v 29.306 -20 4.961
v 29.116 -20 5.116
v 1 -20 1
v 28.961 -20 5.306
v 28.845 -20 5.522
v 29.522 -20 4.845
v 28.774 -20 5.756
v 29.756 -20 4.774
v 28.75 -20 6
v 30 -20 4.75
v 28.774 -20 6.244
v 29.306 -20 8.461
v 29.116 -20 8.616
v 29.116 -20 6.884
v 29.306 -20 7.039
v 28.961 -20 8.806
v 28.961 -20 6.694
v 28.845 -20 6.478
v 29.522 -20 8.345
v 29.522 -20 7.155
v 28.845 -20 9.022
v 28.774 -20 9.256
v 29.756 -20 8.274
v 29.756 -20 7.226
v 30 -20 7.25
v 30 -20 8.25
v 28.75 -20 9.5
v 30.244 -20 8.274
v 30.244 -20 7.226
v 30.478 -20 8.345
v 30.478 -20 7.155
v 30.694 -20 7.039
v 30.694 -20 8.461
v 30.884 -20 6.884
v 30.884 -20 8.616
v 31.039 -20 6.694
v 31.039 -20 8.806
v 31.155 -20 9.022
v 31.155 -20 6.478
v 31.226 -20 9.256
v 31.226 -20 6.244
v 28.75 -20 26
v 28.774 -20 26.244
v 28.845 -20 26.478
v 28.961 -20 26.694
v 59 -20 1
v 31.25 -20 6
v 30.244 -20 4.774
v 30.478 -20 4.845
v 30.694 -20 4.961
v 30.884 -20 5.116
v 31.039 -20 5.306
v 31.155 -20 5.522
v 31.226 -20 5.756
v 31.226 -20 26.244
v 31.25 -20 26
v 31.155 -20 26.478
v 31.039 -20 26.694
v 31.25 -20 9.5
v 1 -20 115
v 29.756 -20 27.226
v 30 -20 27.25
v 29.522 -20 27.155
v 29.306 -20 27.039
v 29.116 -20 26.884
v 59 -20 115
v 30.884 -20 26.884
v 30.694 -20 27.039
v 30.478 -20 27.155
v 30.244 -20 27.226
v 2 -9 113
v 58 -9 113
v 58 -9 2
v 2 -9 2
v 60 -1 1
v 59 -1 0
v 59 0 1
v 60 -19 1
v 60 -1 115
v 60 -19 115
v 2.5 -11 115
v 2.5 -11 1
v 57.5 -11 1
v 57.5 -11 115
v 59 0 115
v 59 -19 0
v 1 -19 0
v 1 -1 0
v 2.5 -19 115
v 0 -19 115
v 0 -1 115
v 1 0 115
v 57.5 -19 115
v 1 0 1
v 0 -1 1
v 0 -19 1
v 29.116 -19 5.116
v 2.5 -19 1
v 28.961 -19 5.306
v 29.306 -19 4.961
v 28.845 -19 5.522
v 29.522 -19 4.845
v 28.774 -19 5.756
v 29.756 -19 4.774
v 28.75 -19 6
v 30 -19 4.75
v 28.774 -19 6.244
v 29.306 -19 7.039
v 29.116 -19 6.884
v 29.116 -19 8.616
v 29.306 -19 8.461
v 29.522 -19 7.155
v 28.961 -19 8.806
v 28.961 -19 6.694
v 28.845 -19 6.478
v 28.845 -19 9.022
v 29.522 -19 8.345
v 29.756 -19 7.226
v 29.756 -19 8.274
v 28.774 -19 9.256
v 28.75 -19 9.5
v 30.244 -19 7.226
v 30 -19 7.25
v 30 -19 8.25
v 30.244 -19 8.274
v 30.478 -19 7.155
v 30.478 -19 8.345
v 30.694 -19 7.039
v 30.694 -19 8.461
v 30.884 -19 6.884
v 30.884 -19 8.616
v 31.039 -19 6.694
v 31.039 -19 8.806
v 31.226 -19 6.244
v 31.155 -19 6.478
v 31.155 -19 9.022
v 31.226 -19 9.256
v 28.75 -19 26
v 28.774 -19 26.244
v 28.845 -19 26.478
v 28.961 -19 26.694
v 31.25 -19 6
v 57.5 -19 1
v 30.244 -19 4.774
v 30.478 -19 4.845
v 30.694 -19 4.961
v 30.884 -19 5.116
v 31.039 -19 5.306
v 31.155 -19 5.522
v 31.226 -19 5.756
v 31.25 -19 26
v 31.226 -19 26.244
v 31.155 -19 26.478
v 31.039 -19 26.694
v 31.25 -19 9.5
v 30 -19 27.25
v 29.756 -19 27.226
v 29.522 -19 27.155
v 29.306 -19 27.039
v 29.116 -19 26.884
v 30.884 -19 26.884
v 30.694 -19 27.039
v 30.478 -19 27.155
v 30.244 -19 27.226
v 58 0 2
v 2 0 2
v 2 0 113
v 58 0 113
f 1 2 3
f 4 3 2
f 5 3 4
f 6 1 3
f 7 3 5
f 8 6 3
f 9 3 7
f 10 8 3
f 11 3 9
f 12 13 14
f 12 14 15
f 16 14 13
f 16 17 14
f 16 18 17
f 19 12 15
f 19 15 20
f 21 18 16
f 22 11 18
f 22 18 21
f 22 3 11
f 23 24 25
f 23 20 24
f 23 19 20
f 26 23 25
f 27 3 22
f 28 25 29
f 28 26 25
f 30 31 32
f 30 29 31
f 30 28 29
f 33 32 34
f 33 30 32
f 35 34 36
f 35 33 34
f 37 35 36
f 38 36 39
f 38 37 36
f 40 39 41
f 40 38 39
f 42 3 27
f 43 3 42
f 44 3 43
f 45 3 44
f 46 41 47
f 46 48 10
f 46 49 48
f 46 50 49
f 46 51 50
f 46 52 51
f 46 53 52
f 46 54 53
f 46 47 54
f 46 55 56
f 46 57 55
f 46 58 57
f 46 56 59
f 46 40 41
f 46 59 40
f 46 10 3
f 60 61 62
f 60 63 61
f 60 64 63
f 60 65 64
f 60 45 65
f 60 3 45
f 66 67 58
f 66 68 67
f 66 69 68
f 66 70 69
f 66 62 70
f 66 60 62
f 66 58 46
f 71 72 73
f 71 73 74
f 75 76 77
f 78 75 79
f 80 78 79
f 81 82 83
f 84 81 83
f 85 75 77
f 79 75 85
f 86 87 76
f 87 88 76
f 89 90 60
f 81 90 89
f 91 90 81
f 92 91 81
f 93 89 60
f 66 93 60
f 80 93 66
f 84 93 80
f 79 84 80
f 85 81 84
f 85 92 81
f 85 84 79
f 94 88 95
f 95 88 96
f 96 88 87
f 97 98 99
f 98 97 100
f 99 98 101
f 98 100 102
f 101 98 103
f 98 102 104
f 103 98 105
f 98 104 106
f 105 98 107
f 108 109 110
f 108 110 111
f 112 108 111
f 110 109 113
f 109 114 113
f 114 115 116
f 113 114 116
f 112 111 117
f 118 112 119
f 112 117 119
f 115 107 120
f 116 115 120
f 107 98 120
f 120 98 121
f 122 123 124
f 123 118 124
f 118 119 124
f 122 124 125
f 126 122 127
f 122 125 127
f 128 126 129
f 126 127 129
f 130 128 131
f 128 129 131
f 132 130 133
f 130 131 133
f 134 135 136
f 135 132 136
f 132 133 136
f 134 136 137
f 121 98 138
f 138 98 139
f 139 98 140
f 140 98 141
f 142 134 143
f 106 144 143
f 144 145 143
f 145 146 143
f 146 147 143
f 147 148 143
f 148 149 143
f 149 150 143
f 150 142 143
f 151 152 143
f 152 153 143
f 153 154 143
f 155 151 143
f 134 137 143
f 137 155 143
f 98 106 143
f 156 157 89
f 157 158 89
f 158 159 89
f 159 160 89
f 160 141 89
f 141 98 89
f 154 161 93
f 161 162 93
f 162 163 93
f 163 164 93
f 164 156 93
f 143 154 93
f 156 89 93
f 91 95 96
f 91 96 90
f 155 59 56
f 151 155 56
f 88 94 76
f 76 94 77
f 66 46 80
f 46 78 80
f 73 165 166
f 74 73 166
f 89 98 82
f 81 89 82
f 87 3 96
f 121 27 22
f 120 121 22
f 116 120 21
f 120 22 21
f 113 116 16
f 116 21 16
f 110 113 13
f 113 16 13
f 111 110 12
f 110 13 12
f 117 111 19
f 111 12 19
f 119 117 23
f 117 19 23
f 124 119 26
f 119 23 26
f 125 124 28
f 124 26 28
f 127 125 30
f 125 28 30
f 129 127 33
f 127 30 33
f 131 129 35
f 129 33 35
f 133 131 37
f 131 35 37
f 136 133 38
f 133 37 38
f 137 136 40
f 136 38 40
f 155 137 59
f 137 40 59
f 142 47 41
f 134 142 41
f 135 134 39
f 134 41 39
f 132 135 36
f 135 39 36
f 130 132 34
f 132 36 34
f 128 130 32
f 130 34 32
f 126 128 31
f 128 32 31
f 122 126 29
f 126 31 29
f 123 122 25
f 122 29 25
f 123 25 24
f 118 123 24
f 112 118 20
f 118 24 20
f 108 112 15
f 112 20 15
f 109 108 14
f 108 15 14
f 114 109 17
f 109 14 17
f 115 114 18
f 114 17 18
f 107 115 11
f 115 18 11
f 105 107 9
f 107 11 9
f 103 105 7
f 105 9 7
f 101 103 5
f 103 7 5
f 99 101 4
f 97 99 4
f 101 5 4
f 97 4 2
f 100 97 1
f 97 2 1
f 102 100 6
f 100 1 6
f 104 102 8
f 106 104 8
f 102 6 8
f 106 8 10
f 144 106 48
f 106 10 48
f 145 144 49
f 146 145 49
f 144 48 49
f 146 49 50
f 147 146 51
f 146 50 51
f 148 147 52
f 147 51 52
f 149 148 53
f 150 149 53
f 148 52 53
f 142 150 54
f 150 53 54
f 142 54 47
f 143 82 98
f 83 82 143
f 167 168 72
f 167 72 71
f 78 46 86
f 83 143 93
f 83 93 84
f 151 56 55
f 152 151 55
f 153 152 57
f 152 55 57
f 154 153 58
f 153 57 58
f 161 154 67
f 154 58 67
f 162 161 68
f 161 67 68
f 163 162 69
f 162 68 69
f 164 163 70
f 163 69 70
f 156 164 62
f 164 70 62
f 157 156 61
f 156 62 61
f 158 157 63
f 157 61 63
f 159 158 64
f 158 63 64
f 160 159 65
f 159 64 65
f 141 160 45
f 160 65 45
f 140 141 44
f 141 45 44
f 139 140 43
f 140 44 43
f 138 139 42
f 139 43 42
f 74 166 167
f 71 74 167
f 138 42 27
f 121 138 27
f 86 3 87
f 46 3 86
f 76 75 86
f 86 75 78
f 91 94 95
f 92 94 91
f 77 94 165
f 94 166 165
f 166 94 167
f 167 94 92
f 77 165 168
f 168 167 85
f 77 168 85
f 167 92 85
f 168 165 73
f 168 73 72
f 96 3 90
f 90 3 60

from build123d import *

# Parameters (mm, degrees)
F0_W     = 60
F0_H     = 115
F1_DEPTH = 20
F3_W     = 55.999996
F3_H     = 110.999996
F4_DEPTH = 9
F2_W     = 55
F2_H     = 8
F5_DEPTH = 114
F6_R     = 1.25
F7_DEPTH = 1
F8_SIZE  = 1


with BuildPart() as f1:
    # F0 (on Front) → F1 (new body)
    with BuildSketch(Plane.XZ):
        with Locations((30, 57.5)):
            Rectangle(F0_W, F0_H)
    extrude(amount=F1_DEPTH)

    # F3 (on face) → F4 (cut)
    with BuildSketch(Plane(origin=(0, 0, 0), x_dir=(-1, 0, 0), z_dir=(0, 1, 0))):
        with Locations((-30, 57.5)):
            Rectangle(F3_W, F3_H)
    extrude(amount=-F4_DEPTH, mode=Mode.SUBTRACT)

    # F2 (on face) → F5 (cut)
    with BuildSketch(Plane.XY.offset(115)):
        with Locations((30, -15)):
            Rectangle(F2_W, F2_H)
    extrude(amount=-F5_DEPTH, mode=Mode.SUBTRACT)

    # F6 (on face) → F7 (cut)
    with BuildSketch(Plane.XZ.offset(20)):
        with BuildLine():
            Line((28.75, 26), (28.75, 9.5))
            ThreePointArc((28.75, 9.5), (30, 8.25), (31.25, 9.5))
            Line((31.25, 9.5), (31.25, 26))
            ThreePointArc((31.25, 26), (30, 27.25), (28.75, 26))
        make_face()
        with Locations((30, 6)):
            Circle(F6_R)
    extrude(amount=-F7_DEPTH, mode=Mode.SUBTRACT)

    # F8
    f8_edges = [f1.edges().sort_by_distance(p)[0] for p in [
        (0, -20, 57.5),
        (60, -20, 57.5),
        (30, -20, 0),
        (60, -10, 0),
        (30, 0, 0),
        (0, -10, 0),
        (0, 0, 57.5),
        (60, 0, 57.5),
    ]]
    chamfer(f8_edges, length=F8_SIZE)


solid = f1.part
